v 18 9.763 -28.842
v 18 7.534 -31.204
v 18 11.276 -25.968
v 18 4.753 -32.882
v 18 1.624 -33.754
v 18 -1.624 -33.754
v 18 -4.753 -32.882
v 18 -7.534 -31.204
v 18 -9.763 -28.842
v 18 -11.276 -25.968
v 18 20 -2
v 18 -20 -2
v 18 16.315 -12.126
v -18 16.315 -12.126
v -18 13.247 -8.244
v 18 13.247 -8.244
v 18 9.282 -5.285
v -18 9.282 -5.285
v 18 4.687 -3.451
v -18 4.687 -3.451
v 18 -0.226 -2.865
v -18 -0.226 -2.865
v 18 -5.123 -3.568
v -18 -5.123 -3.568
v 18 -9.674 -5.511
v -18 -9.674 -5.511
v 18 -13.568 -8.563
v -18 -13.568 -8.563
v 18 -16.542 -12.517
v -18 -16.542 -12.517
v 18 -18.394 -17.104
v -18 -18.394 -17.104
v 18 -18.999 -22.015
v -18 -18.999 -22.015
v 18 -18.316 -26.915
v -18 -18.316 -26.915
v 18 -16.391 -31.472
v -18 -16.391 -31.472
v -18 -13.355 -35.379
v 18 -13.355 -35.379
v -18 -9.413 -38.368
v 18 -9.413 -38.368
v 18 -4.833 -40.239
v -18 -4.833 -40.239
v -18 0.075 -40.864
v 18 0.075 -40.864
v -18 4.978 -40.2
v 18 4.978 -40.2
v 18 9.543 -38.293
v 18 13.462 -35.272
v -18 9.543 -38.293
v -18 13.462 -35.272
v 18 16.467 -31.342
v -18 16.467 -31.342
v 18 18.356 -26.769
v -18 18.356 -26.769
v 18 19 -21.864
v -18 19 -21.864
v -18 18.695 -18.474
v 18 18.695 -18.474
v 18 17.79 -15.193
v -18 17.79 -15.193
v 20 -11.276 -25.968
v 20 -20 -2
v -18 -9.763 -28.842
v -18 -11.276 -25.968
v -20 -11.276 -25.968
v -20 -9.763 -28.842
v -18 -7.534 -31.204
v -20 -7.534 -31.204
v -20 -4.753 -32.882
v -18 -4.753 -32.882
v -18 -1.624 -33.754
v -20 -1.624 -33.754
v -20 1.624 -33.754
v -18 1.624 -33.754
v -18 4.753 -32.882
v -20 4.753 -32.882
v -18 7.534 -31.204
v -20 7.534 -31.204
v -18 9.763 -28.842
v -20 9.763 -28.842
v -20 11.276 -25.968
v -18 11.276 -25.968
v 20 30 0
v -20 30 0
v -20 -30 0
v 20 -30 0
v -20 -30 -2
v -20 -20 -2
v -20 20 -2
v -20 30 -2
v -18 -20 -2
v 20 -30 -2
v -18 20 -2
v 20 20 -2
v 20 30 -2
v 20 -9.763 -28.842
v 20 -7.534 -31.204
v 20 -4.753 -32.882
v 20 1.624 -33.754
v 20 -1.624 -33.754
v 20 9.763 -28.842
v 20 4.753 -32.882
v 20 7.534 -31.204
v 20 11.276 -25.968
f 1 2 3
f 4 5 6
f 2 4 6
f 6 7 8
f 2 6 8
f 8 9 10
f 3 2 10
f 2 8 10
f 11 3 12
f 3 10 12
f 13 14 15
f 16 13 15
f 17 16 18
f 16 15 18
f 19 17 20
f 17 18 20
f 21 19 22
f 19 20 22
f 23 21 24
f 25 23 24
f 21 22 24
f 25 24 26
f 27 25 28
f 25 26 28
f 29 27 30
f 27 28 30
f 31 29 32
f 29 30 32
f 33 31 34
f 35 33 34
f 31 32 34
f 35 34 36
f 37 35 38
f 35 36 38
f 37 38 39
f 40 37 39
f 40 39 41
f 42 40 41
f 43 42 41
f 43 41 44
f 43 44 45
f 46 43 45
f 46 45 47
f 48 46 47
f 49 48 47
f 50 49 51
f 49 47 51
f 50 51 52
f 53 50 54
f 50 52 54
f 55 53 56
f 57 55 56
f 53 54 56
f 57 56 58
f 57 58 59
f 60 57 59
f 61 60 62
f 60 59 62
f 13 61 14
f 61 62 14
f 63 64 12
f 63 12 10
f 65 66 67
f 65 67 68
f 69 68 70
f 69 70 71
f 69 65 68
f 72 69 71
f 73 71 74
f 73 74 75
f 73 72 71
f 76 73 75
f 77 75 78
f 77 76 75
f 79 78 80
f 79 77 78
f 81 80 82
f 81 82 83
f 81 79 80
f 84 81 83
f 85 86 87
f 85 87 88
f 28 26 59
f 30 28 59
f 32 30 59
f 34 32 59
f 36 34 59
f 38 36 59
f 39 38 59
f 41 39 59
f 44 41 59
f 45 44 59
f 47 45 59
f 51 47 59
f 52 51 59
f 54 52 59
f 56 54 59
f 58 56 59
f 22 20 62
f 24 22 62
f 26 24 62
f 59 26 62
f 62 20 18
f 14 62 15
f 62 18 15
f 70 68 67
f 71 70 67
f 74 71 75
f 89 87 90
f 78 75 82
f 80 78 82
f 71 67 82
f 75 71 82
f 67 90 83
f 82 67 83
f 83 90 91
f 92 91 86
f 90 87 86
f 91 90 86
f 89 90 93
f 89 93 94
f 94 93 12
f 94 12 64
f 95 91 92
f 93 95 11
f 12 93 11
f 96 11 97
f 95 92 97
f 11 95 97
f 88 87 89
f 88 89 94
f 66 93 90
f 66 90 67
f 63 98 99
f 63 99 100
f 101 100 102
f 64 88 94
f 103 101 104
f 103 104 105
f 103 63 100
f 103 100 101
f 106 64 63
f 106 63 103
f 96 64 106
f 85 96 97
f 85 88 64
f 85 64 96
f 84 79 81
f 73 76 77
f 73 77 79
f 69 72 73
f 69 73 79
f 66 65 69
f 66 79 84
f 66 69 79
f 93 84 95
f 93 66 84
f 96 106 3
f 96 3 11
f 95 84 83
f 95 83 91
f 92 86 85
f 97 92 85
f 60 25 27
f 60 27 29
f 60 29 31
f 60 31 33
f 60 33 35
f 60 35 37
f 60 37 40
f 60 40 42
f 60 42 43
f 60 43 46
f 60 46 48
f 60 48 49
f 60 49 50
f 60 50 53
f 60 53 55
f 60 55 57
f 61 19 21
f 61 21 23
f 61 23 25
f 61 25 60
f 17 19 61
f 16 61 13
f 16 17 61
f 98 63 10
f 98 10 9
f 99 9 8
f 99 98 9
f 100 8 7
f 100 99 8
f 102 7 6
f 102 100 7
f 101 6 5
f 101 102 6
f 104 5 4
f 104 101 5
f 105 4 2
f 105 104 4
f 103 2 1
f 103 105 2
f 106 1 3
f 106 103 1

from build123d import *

# Parameters (mm, degrees)
F0_W     = 40
F0_H     = 60
F1_DEPTH = 2
F3_DEPTH = 20
F4_W     = 36
F4_H     = 40
F5_DEPTH = 20
F7_DEPTH = 36


with BuildPart() as f1:
    # F0 (on Top) → F1 (new body)
    with BuildSketch(Plane.XY):
        Rectangle(F0_W, F0_H)
    extrude(amount=-F1_DEPTH)

    # F2 (on Right) → F3 (join, symmetric)
    with BuildSketch(Plane.YZ):
        with BuildLine():
            Line((11.2763114494, -25.968137307), (20, -2))
            Line((20, -2), (-20, -2))
            Line((-20, -2), (-11.2763114494, -25.968137307))
            ThreePointArc((-11.2763114494, -25.968137307), (0, -33.8638955871), (11.2763114494, -25.968137307))
        make_face()
    extrude(amount=F3_DEPTH, both=True)

    # F4 (on Front) → F5 (cut, symmetric)
    with BuildSketch(Plane.XZ):
        with Locations((0, -22)):
            Rectangle(F4_W, F4_H)
    extrude(amount=F5_DEPTH, both=True, mode=Mode.SUBTRACT)


with BuildPart() as f7:
    # F6 (on face) → F7 (new body, through all)
    with BuildSketch(Plane.YZ.offset(-18)):
        with BuildLine():
            ThreePointArc((-16.3145827722, -12.1256006147), (-5.0508874135, -40.1802417385), (19, -21.8638955871))
            ThreePointArc((19, -21.8638955871), (18.3163461513, -16.8130081736), (16.3145827722, -12.1256006147))
            Line((16.3145827722, -12.1256006147), (11.2763114494, -25.968137307))
            ThreePointArc((11.2763114494, -25.968137307), (0, -33.8638955871), (-11.2763114494, -25.968137307))
            Line((-11.2763114494, -25.968137307), (-16.3145827722, -12.1256006147))
        make_face()
        with BuildLine():
            Line((11.2763114494, -25.968137307), (16.3145827722, -12.1256006147))
            ThreePointArc((16.3145827722, -12.1256006147), (0, -2.8638955871), (-16.3145827722, -12.1256006147))
            Line((-16.3145827722, -12.1256006147), (-11.2763114494, -25.968137307))
            ThreePointArc((-11.2763114494, -25.968137307), (0, -33.8638955871), (11.2763114494, -25.968137307))
        make_face()
    extrude(amount=F7_DEPTH)


solid = Compound([f1.part, f7.part])
